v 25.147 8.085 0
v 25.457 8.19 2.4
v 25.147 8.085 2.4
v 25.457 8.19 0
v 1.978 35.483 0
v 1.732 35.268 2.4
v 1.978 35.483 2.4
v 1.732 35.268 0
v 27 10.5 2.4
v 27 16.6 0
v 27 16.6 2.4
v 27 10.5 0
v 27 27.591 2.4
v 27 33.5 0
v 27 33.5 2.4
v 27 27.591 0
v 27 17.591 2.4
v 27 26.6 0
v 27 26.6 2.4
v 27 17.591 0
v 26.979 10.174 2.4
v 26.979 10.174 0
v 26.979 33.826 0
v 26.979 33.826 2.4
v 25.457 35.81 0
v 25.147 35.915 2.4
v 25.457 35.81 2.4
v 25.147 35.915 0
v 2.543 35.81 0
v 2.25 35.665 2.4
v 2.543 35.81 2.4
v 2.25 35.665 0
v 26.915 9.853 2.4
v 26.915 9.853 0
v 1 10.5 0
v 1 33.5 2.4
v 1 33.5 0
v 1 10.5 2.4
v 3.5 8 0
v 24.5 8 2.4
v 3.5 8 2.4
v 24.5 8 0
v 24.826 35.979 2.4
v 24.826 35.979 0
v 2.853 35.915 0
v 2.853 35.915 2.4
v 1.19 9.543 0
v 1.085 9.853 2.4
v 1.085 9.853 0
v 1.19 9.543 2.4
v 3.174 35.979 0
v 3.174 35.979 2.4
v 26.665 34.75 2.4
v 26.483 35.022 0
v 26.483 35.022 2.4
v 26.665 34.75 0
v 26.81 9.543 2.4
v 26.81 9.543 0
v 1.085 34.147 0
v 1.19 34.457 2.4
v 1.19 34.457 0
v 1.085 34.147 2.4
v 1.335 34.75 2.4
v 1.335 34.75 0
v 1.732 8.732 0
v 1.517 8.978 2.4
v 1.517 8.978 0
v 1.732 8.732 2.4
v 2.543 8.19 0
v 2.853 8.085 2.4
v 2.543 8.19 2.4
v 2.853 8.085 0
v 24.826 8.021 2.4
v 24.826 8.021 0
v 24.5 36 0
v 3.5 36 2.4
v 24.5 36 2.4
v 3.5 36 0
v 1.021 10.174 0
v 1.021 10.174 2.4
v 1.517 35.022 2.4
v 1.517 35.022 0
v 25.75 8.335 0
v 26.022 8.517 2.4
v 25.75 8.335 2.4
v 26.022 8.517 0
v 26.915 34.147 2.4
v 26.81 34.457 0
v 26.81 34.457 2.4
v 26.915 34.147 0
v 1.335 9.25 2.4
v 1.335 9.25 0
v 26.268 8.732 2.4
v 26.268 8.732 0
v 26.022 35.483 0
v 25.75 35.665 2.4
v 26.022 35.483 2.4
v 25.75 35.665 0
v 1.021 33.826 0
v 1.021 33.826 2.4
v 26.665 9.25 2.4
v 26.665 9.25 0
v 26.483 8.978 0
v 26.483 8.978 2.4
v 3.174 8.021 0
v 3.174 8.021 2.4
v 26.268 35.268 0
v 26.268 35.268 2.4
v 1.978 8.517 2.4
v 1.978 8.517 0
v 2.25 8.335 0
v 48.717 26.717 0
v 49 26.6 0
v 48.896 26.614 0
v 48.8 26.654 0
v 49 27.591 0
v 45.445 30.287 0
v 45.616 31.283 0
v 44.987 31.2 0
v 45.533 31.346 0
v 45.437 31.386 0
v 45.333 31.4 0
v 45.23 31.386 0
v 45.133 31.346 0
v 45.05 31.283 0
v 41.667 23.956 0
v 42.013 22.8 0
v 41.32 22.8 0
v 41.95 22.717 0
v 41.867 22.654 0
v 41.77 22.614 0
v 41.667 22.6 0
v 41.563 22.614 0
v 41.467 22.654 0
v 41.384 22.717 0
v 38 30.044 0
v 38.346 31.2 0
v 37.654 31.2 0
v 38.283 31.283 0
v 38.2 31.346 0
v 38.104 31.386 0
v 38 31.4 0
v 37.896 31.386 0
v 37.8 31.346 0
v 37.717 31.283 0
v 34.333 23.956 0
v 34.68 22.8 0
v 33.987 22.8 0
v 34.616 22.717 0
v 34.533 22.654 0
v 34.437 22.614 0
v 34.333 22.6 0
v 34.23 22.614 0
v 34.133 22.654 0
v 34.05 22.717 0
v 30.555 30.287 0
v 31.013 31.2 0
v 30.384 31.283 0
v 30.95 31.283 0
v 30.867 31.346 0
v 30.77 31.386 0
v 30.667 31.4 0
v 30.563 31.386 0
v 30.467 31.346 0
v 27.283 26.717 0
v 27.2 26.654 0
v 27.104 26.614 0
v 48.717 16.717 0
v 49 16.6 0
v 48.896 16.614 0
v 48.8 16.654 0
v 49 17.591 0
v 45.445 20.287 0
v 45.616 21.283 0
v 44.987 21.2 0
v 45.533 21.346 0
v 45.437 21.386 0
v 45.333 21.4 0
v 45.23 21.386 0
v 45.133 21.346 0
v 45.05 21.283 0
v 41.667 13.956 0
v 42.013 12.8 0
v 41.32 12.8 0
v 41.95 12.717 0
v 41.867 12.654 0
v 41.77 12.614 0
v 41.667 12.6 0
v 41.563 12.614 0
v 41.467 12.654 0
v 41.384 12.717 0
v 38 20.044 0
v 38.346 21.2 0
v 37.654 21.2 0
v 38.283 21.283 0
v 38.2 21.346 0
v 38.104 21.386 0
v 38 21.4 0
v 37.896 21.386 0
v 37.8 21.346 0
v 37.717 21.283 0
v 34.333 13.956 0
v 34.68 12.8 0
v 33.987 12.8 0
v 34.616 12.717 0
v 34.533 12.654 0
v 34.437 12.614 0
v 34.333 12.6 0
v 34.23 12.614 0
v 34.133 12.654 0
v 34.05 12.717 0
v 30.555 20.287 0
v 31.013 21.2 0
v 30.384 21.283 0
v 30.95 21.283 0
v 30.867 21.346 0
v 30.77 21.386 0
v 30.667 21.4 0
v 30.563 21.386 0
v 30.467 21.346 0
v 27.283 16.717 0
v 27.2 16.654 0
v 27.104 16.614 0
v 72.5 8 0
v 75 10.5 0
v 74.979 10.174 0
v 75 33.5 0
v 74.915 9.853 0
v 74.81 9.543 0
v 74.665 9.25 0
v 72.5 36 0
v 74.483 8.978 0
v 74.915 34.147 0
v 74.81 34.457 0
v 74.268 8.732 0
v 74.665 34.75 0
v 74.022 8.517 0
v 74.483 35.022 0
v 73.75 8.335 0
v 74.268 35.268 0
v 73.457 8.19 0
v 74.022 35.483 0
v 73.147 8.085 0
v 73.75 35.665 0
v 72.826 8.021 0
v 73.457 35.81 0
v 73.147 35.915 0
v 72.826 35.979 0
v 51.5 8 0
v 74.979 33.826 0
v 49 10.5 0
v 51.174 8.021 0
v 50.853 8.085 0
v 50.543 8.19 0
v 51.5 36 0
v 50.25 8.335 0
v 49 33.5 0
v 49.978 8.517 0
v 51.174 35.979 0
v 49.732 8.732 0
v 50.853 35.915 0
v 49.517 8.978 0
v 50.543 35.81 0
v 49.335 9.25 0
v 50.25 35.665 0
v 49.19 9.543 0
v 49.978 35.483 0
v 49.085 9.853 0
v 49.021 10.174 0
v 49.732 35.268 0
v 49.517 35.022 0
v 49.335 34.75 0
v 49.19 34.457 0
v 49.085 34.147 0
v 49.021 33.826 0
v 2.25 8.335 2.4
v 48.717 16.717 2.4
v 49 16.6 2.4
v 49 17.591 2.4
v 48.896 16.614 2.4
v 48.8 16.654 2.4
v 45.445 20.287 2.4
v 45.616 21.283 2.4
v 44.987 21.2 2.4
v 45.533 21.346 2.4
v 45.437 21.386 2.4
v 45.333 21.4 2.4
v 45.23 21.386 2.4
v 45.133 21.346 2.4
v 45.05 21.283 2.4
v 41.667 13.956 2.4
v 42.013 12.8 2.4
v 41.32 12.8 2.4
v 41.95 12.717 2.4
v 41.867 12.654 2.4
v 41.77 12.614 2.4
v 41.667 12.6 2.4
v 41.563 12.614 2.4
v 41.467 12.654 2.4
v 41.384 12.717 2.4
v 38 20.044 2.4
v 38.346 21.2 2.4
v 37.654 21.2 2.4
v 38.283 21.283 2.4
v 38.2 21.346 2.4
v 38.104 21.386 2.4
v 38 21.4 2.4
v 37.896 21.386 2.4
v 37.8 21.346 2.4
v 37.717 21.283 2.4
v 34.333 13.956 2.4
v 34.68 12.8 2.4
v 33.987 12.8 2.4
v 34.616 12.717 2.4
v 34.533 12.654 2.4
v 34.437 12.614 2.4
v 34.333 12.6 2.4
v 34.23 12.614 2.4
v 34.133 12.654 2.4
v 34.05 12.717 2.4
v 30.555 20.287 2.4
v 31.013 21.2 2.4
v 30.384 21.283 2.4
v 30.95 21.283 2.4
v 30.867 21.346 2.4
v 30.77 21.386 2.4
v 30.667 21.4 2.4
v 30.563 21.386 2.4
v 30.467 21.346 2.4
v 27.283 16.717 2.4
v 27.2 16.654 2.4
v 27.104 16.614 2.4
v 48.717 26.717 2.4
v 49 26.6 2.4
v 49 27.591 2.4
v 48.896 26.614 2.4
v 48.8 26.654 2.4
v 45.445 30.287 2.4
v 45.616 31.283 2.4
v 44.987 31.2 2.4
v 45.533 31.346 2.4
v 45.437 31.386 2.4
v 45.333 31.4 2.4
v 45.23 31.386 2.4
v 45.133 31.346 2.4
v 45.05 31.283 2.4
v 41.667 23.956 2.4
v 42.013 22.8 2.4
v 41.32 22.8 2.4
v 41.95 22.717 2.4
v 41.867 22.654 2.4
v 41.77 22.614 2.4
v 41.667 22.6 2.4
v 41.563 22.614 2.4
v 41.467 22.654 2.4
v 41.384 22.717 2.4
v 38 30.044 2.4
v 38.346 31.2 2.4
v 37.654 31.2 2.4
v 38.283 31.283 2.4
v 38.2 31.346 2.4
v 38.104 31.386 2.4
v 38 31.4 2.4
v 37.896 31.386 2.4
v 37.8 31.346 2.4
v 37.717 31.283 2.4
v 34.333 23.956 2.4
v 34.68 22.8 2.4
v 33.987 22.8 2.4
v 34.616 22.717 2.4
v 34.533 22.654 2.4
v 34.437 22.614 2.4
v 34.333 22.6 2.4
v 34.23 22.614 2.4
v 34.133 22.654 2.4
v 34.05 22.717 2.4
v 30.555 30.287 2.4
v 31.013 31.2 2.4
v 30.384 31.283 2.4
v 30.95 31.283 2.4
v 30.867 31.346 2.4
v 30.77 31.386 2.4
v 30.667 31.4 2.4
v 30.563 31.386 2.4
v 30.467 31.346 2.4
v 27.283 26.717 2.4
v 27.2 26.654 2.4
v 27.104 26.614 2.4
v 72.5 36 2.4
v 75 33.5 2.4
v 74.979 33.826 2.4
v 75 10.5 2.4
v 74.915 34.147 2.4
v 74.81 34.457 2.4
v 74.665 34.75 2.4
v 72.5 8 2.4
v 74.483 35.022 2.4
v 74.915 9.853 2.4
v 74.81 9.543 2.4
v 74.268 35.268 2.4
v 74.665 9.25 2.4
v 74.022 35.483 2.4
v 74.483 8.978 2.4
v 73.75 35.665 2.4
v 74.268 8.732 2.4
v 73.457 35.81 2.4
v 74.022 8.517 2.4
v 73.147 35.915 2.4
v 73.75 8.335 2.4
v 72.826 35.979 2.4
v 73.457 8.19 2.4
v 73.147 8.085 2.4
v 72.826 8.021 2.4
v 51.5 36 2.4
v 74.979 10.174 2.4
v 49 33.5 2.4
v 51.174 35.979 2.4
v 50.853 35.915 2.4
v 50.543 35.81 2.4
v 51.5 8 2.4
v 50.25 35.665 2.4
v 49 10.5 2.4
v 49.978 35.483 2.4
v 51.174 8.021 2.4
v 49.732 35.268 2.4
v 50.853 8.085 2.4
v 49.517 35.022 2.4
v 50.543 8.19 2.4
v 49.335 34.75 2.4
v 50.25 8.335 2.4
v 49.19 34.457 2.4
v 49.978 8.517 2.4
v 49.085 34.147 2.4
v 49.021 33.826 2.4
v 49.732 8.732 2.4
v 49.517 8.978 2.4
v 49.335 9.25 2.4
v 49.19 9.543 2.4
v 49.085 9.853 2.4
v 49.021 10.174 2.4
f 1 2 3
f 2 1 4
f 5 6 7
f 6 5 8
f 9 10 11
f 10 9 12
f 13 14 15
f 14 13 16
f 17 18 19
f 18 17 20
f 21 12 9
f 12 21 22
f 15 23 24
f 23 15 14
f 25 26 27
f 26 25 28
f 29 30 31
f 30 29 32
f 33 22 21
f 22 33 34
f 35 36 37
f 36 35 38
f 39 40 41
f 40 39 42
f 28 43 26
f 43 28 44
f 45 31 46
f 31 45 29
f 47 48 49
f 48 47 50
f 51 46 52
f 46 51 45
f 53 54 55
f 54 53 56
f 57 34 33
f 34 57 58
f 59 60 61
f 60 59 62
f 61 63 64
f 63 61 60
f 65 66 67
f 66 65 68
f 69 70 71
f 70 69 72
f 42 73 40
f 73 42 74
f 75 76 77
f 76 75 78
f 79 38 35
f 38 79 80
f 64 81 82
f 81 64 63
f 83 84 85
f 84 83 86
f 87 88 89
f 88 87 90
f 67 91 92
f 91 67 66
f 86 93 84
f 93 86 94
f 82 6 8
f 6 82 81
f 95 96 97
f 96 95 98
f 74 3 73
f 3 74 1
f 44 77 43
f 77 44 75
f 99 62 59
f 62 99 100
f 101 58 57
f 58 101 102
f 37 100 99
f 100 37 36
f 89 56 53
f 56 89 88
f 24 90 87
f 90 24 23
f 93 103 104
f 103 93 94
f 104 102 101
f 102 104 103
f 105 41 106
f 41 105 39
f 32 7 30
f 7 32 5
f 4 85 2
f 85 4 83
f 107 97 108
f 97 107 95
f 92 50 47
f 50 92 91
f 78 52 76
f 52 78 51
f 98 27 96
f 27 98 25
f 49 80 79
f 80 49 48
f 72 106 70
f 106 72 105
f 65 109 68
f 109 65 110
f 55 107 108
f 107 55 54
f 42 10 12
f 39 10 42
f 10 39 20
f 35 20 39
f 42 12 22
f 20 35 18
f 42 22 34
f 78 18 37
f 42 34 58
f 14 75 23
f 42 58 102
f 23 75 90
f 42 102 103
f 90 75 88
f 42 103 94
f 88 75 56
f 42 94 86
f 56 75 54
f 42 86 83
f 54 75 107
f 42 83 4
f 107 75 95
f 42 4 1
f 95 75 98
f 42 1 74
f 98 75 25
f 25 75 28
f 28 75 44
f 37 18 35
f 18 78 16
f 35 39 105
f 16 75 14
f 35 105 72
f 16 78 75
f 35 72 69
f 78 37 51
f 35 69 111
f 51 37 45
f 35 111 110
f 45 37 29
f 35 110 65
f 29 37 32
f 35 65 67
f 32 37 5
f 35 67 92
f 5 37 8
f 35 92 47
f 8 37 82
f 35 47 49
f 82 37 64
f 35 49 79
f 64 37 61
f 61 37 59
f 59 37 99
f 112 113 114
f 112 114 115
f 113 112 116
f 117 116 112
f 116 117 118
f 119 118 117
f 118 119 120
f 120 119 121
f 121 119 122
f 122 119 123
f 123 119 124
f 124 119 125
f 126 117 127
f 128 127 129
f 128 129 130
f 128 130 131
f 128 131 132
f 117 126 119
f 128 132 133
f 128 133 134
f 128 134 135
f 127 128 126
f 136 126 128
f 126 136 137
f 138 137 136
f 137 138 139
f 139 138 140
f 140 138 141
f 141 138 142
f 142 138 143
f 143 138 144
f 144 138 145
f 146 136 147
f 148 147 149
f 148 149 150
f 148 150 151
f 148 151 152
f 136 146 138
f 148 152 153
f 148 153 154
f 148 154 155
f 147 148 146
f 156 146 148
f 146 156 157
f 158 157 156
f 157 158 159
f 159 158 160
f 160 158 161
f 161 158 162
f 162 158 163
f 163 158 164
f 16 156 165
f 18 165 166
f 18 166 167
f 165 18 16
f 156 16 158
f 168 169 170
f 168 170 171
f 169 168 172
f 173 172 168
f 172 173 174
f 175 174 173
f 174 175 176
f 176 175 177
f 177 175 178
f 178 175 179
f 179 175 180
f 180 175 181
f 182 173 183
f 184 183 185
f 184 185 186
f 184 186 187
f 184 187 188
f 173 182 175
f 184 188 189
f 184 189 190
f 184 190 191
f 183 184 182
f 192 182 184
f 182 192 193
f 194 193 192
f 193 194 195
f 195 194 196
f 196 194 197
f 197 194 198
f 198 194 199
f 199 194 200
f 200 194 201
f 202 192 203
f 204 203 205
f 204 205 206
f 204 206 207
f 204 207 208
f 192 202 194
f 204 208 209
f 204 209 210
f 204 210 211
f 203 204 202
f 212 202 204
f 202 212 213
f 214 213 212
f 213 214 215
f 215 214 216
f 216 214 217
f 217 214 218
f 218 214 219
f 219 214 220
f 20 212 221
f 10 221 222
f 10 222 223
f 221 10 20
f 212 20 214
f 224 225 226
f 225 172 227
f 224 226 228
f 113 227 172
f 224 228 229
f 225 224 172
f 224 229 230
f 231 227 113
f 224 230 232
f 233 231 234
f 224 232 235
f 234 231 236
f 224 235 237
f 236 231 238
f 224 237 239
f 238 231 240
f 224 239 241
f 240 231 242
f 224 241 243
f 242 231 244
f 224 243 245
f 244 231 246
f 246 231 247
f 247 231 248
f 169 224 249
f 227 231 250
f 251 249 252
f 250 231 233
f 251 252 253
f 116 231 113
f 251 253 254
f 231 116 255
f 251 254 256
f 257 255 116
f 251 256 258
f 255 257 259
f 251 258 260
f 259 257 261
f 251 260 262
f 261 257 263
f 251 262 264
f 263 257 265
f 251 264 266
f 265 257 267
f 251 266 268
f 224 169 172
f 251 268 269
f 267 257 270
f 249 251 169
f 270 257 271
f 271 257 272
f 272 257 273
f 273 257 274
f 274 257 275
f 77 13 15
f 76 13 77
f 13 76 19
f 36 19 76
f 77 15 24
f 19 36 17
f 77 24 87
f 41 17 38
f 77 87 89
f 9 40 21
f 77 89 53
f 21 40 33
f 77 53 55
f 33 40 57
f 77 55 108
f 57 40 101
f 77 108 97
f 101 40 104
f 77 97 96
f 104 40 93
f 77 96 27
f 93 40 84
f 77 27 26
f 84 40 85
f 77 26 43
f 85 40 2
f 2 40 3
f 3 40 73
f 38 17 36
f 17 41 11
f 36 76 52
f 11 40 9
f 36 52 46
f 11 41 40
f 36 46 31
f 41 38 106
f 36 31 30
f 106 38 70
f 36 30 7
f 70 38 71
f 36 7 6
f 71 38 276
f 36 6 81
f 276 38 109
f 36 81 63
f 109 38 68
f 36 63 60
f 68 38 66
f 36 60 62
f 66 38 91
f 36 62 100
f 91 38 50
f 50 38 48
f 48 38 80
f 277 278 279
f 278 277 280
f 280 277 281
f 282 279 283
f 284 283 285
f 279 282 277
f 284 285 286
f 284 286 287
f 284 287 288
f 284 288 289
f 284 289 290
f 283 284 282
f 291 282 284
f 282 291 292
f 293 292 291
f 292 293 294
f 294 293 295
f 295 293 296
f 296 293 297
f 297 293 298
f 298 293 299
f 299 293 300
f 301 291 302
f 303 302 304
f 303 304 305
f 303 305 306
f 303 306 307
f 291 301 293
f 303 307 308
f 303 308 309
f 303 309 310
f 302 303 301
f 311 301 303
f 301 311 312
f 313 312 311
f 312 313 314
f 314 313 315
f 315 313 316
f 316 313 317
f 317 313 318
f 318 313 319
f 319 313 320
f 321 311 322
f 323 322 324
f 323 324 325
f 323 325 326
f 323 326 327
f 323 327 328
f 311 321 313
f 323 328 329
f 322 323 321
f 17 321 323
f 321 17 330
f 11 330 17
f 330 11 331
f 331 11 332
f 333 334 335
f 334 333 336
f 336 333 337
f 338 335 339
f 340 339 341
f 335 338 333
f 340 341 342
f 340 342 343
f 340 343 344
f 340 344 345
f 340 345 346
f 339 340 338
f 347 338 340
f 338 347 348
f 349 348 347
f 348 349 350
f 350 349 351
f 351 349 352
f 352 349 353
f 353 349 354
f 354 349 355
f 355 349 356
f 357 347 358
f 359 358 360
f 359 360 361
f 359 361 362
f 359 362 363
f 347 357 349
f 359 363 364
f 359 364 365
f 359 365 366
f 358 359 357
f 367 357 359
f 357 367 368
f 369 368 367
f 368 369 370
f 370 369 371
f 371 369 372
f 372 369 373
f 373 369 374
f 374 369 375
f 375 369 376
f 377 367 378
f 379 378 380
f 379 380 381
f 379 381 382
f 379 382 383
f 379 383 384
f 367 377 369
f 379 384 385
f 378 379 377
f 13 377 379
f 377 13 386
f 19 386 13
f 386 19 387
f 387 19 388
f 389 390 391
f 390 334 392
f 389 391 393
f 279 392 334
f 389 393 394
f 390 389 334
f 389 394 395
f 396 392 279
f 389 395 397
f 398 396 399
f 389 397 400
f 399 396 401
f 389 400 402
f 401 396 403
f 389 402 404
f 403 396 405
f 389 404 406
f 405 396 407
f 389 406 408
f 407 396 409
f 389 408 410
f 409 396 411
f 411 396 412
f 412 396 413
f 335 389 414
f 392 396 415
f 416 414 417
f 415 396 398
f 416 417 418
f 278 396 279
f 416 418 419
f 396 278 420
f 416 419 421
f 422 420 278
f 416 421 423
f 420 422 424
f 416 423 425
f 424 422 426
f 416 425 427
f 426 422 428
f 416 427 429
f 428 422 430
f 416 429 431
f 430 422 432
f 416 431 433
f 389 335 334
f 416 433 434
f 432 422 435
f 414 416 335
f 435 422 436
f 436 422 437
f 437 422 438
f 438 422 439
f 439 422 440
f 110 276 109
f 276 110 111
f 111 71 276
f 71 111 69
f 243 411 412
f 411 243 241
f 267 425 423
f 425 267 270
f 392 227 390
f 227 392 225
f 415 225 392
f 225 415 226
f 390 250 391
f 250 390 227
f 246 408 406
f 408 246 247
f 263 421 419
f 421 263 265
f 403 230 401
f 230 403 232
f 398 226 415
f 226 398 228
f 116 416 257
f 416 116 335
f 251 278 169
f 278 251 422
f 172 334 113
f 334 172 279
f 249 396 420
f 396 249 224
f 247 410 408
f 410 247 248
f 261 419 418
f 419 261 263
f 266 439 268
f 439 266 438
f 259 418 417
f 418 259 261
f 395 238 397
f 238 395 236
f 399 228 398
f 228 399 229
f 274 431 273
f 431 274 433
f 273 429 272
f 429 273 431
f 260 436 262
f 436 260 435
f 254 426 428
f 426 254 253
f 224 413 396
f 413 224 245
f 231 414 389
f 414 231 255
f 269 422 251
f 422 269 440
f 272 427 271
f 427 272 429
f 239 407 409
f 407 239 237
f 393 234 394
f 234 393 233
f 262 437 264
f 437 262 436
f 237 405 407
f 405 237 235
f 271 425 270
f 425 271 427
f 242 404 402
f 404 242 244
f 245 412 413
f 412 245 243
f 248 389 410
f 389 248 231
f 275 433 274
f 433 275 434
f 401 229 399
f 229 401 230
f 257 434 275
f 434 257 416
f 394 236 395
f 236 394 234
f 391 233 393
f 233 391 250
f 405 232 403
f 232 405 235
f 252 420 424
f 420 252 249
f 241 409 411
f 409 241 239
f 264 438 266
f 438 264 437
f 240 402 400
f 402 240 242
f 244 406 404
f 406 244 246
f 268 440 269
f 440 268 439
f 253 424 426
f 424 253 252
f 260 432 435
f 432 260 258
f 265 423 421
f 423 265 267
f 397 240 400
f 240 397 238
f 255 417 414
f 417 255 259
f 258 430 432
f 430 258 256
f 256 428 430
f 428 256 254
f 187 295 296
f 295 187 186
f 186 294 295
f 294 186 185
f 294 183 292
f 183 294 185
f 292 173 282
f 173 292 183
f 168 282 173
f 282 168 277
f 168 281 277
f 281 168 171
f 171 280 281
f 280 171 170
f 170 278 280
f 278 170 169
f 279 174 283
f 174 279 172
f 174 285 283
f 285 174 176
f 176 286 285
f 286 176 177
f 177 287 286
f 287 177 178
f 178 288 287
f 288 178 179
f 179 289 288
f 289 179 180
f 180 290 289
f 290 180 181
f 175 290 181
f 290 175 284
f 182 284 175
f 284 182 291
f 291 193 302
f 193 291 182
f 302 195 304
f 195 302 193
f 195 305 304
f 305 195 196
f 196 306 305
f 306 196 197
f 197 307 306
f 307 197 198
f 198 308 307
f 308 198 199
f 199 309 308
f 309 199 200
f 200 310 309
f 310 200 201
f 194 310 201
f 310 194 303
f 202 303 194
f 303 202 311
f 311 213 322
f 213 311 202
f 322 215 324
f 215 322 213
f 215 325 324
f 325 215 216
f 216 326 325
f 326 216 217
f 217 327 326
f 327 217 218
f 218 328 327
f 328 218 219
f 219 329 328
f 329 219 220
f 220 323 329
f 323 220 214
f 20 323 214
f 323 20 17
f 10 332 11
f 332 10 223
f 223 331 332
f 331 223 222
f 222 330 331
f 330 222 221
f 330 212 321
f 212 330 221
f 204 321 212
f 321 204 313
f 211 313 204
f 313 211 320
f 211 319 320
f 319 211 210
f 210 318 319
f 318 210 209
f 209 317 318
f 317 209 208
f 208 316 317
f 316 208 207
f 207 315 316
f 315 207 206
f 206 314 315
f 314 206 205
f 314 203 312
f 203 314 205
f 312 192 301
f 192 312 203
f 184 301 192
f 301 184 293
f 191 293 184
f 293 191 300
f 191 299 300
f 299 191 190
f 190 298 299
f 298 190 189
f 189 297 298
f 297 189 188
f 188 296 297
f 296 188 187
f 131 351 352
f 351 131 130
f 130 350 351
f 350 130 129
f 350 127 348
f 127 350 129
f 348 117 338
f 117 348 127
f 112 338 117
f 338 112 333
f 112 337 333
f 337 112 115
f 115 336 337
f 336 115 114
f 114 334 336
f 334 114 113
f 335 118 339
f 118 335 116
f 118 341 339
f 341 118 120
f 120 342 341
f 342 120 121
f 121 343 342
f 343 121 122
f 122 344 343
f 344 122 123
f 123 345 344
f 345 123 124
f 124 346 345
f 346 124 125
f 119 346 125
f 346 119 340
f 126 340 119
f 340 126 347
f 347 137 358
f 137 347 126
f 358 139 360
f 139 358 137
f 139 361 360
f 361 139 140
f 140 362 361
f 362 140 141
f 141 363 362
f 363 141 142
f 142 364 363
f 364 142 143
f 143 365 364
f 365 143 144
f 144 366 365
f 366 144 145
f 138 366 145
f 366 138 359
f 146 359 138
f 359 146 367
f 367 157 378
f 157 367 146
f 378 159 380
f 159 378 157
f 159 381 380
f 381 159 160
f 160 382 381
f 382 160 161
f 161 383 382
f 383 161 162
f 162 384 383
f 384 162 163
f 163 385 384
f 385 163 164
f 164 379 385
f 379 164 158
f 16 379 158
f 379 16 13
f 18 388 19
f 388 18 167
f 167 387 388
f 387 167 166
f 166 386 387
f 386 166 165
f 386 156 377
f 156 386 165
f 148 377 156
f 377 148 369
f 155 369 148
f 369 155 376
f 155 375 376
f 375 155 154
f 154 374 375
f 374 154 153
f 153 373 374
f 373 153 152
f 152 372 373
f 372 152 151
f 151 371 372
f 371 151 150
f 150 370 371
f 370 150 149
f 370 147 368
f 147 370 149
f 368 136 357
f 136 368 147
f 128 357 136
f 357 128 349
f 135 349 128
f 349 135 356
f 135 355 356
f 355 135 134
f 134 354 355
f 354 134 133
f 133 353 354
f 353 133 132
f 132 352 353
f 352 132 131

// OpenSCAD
/*
Sample 013: Serpentinen-Filmgelenk — 0,8 mm Bahn
Generated from the FDM Mechanical Sample Library.
Units: millimetres.

Override examples:
  openscad -o custom.stl -D 'view="plate"' -D 'render_fn=64' model.scad
  openscad -o preview.png -D 'view="assembly"' model.scad
*/
use <../../../library/fdm_mechanisms.scad>

render_fn = is_undef(render_fn) ? 48 : render_fn;
view = is_undef(view) ? "plate" : view;
$fn = render_fn;

sample_serpentine_hinge(
    view=view,
    beam_w=0.8,
    gap=22
);
